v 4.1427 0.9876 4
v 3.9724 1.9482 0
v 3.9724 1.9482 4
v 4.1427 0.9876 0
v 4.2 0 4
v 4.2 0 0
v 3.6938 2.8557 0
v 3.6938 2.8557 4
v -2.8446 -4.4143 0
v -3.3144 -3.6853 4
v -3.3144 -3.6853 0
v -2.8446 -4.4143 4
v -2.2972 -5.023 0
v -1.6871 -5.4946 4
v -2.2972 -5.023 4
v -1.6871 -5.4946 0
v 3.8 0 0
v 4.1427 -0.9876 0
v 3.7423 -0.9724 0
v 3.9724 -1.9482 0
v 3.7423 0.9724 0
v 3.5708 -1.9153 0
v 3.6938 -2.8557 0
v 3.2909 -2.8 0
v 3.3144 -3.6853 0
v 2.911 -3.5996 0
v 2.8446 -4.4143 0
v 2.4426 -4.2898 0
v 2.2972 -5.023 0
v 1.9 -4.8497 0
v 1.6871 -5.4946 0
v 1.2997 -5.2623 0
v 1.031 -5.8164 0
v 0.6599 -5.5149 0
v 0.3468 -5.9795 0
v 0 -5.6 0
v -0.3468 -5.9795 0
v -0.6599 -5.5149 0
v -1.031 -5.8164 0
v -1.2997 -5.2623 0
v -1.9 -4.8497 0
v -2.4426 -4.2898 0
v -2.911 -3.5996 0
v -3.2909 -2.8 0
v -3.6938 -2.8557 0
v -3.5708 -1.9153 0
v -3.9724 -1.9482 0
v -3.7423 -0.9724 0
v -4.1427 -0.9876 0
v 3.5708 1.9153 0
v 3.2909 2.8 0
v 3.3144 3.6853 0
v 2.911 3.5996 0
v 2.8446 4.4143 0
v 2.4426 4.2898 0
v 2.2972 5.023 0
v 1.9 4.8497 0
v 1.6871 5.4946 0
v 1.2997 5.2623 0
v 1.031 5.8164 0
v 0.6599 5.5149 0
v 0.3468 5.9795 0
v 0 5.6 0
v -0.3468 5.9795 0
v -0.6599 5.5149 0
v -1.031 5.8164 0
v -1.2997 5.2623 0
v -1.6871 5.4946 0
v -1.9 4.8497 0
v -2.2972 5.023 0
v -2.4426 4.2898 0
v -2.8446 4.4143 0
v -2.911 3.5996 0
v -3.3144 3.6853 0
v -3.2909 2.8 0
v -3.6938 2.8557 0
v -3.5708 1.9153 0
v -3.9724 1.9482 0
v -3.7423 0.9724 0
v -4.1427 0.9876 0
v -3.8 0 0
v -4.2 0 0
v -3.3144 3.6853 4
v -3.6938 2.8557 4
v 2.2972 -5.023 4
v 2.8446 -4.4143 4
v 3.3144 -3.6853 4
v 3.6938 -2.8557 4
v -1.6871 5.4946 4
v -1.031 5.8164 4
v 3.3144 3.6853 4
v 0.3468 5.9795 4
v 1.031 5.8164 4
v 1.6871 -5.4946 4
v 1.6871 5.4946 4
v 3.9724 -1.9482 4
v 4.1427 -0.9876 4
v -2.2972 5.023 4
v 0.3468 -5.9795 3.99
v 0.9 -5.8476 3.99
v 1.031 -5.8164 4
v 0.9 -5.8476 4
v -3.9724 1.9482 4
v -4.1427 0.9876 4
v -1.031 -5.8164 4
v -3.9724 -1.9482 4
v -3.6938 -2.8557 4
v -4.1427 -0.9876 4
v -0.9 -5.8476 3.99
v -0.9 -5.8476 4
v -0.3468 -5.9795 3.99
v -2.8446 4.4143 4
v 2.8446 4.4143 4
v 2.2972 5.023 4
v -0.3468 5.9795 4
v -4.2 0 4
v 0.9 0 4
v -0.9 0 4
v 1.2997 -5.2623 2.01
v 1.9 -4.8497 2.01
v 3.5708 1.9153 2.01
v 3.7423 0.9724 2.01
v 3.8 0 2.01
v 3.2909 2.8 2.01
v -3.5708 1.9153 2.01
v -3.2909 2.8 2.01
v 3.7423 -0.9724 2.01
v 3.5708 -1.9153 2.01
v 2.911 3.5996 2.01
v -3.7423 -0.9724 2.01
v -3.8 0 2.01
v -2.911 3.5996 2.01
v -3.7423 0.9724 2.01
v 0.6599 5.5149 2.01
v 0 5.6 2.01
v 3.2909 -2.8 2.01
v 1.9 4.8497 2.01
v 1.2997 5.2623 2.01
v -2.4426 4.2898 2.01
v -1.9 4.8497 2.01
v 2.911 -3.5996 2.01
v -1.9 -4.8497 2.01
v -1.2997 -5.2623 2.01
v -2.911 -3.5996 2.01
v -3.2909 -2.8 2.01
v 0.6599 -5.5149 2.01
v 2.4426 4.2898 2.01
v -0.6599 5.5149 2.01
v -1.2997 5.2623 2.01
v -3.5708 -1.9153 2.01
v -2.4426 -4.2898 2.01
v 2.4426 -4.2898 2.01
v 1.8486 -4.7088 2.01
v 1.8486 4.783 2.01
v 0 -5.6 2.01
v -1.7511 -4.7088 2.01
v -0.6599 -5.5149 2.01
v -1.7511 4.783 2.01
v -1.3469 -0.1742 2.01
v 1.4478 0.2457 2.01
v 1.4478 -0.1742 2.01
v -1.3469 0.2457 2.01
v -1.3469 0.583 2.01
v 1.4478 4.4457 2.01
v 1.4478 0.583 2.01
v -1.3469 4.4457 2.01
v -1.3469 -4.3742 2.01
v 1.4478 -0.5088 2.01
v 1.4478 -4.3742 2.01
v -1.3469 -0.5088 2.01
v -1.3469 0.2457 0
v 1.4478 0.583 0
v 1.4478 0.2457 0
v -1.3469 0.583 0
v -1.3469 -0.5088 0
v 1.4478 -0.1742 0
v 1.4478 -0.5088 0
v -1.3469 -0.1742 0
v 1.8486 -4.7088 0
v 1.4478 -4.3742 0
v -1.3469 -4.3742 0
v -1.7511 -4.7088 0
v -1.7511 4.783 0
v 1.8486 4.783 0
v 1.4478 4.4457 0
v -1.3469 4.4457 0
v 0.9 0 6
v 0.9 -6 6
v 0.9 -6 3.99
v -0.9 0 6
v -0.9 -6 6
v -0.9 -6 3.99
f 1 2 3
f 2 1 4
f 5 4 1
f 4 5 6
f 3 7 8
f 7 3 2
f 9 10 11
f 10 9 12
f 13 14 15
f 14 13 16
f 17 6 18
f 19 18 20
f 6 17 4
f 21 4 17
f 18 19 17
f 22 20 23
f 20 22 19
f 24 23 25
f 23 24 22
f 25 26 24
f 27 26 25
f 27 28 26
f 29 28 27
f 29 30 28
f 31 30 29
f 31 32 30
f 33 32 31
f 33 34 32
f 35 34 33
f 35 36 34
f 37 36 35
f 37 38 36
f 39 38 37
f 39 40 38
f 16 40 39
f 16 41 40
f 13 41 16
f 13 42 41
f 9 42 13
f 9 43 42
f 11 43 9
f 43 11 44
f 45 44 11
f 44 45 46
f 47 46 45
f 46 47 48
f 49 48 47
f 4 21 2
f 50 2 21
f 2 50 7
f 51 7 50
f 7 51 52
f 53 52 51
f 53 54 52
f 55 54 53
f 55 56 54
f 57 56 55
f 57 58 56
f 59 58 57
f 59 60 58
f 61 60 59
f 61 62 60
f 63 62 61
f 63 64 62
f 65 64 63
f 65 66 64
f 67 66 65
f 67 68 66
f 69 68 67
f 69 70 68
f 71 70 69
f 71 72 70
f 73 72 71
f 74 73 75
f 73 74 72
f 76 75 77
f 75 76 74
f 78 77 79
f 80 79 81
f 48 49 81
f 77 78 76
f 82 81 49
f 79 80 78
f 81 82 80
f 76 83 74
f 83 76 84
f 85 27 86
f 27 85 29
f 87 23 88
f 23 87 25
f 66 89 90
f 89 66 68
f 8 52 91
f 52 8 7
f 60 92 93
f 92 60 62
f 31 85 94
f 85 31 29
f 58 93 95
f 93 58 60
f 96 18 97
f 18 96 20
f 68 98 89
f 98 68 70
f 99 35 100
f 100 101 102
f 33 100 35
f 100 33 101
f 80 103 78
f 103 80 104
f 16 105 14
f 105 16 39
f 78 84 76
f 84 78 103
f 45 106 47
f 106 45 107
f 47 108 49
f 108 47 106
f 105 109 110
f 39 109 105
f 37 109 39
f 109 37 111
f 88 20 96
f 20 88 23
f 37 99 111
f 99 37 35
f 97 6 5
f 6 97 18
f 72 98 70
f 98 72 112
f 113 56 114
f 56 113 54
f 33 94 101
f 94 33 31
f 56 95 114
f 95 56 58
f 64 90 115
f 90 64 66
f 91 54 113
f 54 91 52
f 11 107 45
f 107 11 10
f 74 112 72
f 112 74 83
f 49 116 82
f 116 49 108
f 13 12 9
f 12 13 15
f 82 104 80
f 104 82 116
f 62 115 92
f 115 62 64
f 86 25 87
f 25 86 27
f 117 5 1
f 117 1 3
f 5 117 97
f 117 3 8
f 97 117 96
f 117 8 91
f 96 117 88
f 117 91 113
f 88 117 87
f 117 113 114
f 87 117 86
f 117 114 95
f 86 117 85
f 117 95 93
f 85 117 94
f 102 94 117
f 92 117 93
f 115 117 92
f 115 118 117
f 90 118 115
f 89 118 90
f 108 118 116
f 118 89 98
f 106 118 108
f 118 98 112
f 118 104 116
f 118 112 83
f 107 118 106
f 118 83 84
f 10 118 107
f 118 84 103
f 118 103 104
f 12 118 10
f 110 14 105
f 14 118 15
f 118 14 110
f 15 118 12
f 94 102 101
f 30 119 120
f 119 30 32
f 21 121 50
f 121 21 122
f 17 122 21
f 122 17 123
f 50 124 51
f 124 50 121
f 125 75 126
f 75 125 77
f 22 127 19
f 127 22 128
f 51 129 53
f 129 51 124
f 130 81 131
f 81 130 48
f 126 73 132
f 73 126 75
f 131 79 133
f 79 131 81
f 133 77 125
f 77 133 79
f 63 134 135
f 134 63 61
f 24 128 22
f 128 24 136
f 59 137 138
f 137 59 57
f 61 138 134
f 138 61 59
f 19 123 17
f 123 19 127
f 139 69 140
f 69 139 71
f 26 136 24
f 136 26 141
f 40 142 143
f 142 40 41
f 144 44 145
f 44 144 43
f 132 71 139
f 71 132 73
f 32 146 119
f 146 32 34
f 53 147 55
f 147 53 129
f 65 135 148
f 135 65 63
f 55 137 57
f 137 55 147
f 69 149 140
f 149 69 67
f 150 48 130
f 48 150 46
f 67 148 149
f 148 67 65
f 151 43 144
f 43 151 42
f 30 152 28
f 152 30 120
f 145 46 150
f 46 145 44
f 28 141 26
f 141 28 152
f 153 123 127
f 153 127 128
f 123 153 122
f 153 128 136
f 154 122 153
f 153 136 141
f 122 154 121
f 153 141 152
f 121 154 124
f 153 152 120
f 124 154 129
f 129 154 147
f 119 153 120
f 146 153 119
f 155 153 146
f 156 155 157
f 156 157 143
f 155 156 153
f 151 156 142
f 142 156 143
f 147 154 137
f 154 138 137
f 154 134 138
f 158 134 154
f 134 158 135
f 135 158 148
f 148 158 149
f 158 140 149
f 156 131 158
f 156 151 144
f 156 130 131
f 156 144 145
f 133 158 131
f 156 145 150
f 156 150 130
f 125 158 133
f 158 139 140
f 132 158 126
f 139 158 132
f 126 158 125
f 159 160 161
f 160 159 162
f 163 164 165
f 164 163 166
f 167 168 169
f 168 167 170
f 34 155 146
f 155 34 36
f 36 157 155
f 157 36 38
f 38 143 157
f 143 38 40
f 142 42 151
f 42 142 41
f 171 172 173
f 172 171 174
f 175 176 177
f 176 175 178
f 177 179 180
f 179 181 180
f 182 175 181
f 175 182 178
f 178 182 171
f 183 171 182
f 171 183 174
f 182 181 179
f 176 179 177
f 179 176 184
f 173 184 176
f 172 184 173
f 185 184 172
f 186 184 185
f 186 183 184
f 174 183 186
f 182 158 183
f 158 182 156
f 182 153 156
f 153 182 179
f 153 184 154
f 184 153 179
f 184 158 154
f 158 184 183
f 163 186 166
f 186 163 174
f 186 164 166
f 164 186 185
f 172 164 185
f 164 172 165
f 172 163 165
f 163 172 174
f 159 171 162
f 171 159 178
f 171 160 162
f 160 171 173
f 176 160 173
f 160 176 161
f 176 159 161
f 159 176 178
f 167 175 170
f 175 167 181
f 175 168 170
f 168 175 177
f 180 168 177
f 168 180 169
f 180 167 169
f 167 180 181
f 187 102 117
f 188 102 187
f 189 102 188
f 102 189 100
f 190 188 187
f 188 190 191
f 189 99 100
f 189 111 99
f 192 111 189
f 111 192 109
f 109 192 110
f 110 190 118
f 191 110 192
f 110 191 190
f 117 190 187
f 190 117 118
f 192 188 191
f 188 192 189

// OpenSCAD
// -*- mode: SCAD ; c-file-style: "ellemtel" ; coding: utf-8 -*-
//
// Mitome in
//
// (c) 2017-2018 Roland Sieker <ospalh@gmail.com>
// All rights reserved

/* [Global] */

// Set up the text for either rubber_seal or seal_with_grip. Then switch to render below, select the shapes you need one by one and render and export them.
part = "rubber_seal"; // [rubber_seal, grip, seal_with_grip, cap, ink_pad, foam_punch, ink_pad_cap]


// Set this to "render" and click on "Create Thing" when done with the setup.
preview = 1; // [0:render, 1:preview]

/* [Text] */
// First line of text. Leave empty for one line
line_1 = "馬";
// Single line of text. Leave empty for two line
line_2 = "";
// Second line of text. Leave empty for one line
line_3 = "鹿";

// Pick a font you have and that has the characters you want to use
font = "IPAexGothic:style=Regular";

/* [Size] */
// Standard non-registerend seals usually aren't much bigger than about 12 mm high
size = 12; // [9:1:20]

/* [Tweaks] */

// Text size in mm
text_size = 4.32;  // [1:0.01:10]


// Scale characters in x direction
text_x_scale = 1.2;  // [0.3:0.01:3]
// Make the seal an ellipse, one direction
seal_x_scale = 0.7;  // [0.3:0.01:1]
// or the other. One of these should be 1.
seal_y_scale = 1;  // [0.3:0.01:1]

// Move the text around until it fits.
vertical_text_offset = 2.1;  // [-5:0.01:5]
horizontal_text_offset = 0;  // [-5:0.01:5]


/* [Hidden] */

// *******************************************************
// Extra parameters. These can be changed reasonably safely.

height = 60;  // of the seal or grip

w=1.8;  // Wall width
w2=3.2;  // Wall width for ink pad
clearance = 0.5;
bd=0.4;  // Width of the ring around the characetrs

ink_pad_height = 15;

punch_clearance = 0.1;
punch_wall = 0.4;


char_h = 2; // How much air for the characters
rubber_h = 2; // How much stuff on top to hold it together
cap_h=10;  // How high the cap should be

pad_cap_h = 5;

// Sizes for smaller parts &c.
notch_r = 0.8;
notch_a = 3;
grip_a = 3.2;
ball_df = 0.35;
connector_z=2;

// For the ink pad cap
r_f = 1.2;  // filleting radius
r_r = 0.8;  // rounding radius


// *******************************************************
// Some shortcuts. These shouldn't be changed


// Main size
r_1y = size/2 * seal_y_scale;
r_1x = size/2 * seal_x_scale;
// r_1x = 8;

// inner print area size
r_0y = r_1y - bd;
r_0x = r_1x - bd;

// cap inner size
r_2y = r_1y + clearance;
r_2x = r_1x + clearance;

// cap outer size
r_3y = r_2y + w;
r_3x = r_2x + w;

r_1max = max(r_1x, r_1y);
r_4 = r_1max + 3*clearance;

// ink pad outer size.
r_5 = r_4 + w2;

// ink pad foam punch outer diameter
r_7 = r_4 - punch_clearance;
// inpk pad foam punch inner diameter
r_6 = r_7 - punch_wall;


r_b = 0.2*r_1y;

// for the ink pad cap
r_8 = r_4 - 0.7 * r_f;
r_9 = r_8 * 0.9;  // ex r_u

ms=0.01; // Muggeseggele

some_distance = r_5 + r_1max + w2;

// fn for differently sized objects and fs, fa; all for preview or rendering.
pna = 40;
pnb = 15;
pa = 5;
ps = 1;
rna = 180;
rnb = 30;
ra = 1;
rs = 0.1;
function na() = (preview) ? pna : rna;
function nb() = (preview) ? pnb : rnb;
$fs = (preview) ? ps : rs;
$fa = (preview) ? pa : ra;

// *******************************************************
// End setup



// *******************************************************
// Generate the parts

print_part();
// preview_parts();


module print_part()
{
   if ("rubber_seal" == part)
   {
      rubber_mitome_in();
   }
   if ("grip" == part)
   {
      notched_grip();
   }
   if ("cap" == part)
   {
      notched_cap();
   }
   if ("ink_pad" == part)
   {
      notched_ink_pad();
   }
   if ("foam_punch" == part)
   {
      ink_pad_punch();
   }
   if ("seal_with_grip" == part)
   {
      notched_high_mitome_in();
   }
   if ("ink_pad_cap" == part)
   {
      notched_ink_pad_cap();
   }
}


module preview_parts()
{
   rubber_mitome_in();
   translate([some_distance, some_distance, 0])
   {
      notched_grip();
   }
   translate([0, some_distance, 0])
   {
      notched_cap();
   }
   translate([some_distance, 0, 0])
   {
      notched_ink_pad();
   }
   translate([some_distance, 2*some_distance, 0])
   {
      ink_pad_punch();
   }
   translate([0, 2*some_distance, 0])
   {
      notched_high_mitome_in();
   }
   translate([2*some_distance, some_distance, 0])
   {
      notched_ink_pad_cap();
   }
}


// *******************************************************
// Code for the parts themselves



module notched_cap()
{
   difference()
   {
      cap();
      notches(r_3x, r_3y, notch_a);
   }
}

module notched_ink_pad()
{
   difference()
   {
      ink_pad();
      notches(r_5, r_5, notch_a);
   }
}

module notched_grip()
{
   difference()
   {
      grip();
      notches(r_1x, r_1y, grip_a);
   }
}


module notches(wx, wy, a)
{
   if (wx < wy)
   {
      notches_x(wx, a);
   }
   else
   {
      rotate(90)
      {
         notches_x(wy, a);
      }
   }
}

module notches_x(w, a)
{
   rotate([0, 90, 0])
   {
      cylinder(r=notch_r, h=2*w, center=true);
   }
   z_notch();
   mirror()
   {
      z_notch();
   }
   module z_notch()
   {
      translate([w, 0, 0])
      {
         rotate([0, a, 0])
         cylinder(r=notch_r, h=height);
      }
   }
}

module notched_high_mitome_in()
{
   difference()
   {
      mitome_in(height, false, true);
      translate([0, 0, height+char_h])
      {
         rotate([180, 0, 0])
         {
            notches(r_1x, r_1y, grip_a);
         }
      }
   }
}

module rubber_mitome_in()
{
   mitome_in(rubber_h, true, false);
}


module mitome_in(sh, tp, sb)
{
   mti_h = char_h+sh;
   // rotate([180,0,0])
   union()
   {
      difference()
      {
         scale([r_1x/r_1y, 1, 1])
         {
            cylinder(r=r_1y, h=mti_h);
         }
         scale([r_0x/r_0y, 1, 1])
         {
            translate([0,0,-ms])
            {
               cylinder(r=r_0y, h=char_h+2*ms);
            }
              }
           }
        }
   intersection()
   {
      linear_extrude(height=char_h+0.5*sh, scale=1, convexity=10)
      {
         all_text();
      }
      scale([(r_1x/r_1y), 1, 1])
      {
         translate([0,0,-ms-char_h])
         {
            cylinder(r=r_1y-ms, h=2*char_h+sh);
         }
      }
   }

   if (tp)
   {
      translate([-w/2, -r_1y, mti_h-ms])
      {
         cube([w, r_1y, connector_z+ms]);
      }
   }
   if (sb)
   {
      translate([-r_1x+r_b*ball_df, 0, char_h+sh/2])
      {
         sphere(r=r_b);
      }

   }
}

module grip()
{
   // rotate([180,0,0])
    translate([0, 0, height/2])
    {
       difference()
       {
          union()
          {
             scale([r_1x/r_1y, 1, 1])
             {
                cylinder(r=r_1y, h=height, center=true);
             }

             translate([-r_1x+r_b*ball_df,0,0])
             {
                sphere(r=r_b);
             }
          }
          translate([w/2+clearance, -clearance, height/2+ms])
          {
             rotate([0, 180, 0])
             {
                cube([w+ 2*clearance, r_2y, connector_z+w+ms]);
             }
          }
       }
    }
}


module cap()
{
   difference()
    {
      scale([r_3x/r_3y, 1, 1])
      {
         cylinder(r=r_3y, h=cap_h);
      }
      translate([0,0,w])
      {
         scale([r_2x/r_2y, 1, 1])
         {
            cylinder(r=r_2y, h=cap_h);
         }
      }
    }
}
module ink_pad()
{
   difference()
   {
      cylinder(r=r_5, h=ink_pad_height);
      translate([0,0,w2])
      {
         cylinder(r=r_4, h=ink_pad_height);
      }
   }
}


module ink_pad_punch()
{
   difference()
   {
      cylinder(r=r_7, h=ink_pad_height);
      translate([0,0,w])
      {
         cylinder(r=r_6, h=ink_pad_height);
      }
   }
}


module notched_ink_pad_cap()
{
   difference()
   {
      ink_pad_cap();
      notches(r_5, r_5, notch_a);
   }
}

module ink_pad_cap()
{
   translate([0,0,pad_cap_h+w2])
   {
      mirror([0,0,1])
      {
         rotate_extrude()
         {
            2d_ink_pad_cap();
         }
      }
   }
}

module 2d_ink_pad_cap()
{
   rot_points = [
      [0, 0],
      [r_9-r_r, 0],
      [r_9-r_r, r_r],
      [r_9, r_r],
      [r_8, pad_cap_h-r_f],
      [r_8, pad_cap_h],
      [r_5-r_r, pad_cap_h],
      [r_5-r_r, pad_cap_h+r_r],
      [r_5, pad_cap_h+r_r],
      [r_5, pad_cap_h+w2-r_r],
      [r_5-r_r, pad_cap_h+w2-r_r],
      [r_5-r_r, pad_cap_h+w2],
      [0, pad_cap_h+w2],
      ];
  polygon(rot_points);
  translate([r_9-r_r, r_r])
  {
     circle(r=r_r);
  }
  translate([r_8, pad_cap_h-r_f])
  {
     difference()
     {
        square([r_f, r_f]);
        translate([r_f,0])
        {
           circle(r=r_f);
        }
     }
  }
  translate([r_5-r_r, pad_cap_h+r_r])
  {
     circle(r=r_r);
  }
  translate([r_5-r_r, pad_cap_h+w2-r_r])
  {
     circle(r=r_r);
  }
}

module all_text()
{
 one_text(line_1, horizontal_text_offset, vertical_text_offset);
 one_text(line_2, horizontal_text_offset, 0);
 one_text(line_3, horizontal_text_offset, -vertical_text_offset);
}

module one_text(t, x, y)
{
   translate([x, y])
   {
      scale([text_x_scale,1])
      {
         text(
            t, font=font, size=text_size, halign="center", valign="center");
      }
   }
}
